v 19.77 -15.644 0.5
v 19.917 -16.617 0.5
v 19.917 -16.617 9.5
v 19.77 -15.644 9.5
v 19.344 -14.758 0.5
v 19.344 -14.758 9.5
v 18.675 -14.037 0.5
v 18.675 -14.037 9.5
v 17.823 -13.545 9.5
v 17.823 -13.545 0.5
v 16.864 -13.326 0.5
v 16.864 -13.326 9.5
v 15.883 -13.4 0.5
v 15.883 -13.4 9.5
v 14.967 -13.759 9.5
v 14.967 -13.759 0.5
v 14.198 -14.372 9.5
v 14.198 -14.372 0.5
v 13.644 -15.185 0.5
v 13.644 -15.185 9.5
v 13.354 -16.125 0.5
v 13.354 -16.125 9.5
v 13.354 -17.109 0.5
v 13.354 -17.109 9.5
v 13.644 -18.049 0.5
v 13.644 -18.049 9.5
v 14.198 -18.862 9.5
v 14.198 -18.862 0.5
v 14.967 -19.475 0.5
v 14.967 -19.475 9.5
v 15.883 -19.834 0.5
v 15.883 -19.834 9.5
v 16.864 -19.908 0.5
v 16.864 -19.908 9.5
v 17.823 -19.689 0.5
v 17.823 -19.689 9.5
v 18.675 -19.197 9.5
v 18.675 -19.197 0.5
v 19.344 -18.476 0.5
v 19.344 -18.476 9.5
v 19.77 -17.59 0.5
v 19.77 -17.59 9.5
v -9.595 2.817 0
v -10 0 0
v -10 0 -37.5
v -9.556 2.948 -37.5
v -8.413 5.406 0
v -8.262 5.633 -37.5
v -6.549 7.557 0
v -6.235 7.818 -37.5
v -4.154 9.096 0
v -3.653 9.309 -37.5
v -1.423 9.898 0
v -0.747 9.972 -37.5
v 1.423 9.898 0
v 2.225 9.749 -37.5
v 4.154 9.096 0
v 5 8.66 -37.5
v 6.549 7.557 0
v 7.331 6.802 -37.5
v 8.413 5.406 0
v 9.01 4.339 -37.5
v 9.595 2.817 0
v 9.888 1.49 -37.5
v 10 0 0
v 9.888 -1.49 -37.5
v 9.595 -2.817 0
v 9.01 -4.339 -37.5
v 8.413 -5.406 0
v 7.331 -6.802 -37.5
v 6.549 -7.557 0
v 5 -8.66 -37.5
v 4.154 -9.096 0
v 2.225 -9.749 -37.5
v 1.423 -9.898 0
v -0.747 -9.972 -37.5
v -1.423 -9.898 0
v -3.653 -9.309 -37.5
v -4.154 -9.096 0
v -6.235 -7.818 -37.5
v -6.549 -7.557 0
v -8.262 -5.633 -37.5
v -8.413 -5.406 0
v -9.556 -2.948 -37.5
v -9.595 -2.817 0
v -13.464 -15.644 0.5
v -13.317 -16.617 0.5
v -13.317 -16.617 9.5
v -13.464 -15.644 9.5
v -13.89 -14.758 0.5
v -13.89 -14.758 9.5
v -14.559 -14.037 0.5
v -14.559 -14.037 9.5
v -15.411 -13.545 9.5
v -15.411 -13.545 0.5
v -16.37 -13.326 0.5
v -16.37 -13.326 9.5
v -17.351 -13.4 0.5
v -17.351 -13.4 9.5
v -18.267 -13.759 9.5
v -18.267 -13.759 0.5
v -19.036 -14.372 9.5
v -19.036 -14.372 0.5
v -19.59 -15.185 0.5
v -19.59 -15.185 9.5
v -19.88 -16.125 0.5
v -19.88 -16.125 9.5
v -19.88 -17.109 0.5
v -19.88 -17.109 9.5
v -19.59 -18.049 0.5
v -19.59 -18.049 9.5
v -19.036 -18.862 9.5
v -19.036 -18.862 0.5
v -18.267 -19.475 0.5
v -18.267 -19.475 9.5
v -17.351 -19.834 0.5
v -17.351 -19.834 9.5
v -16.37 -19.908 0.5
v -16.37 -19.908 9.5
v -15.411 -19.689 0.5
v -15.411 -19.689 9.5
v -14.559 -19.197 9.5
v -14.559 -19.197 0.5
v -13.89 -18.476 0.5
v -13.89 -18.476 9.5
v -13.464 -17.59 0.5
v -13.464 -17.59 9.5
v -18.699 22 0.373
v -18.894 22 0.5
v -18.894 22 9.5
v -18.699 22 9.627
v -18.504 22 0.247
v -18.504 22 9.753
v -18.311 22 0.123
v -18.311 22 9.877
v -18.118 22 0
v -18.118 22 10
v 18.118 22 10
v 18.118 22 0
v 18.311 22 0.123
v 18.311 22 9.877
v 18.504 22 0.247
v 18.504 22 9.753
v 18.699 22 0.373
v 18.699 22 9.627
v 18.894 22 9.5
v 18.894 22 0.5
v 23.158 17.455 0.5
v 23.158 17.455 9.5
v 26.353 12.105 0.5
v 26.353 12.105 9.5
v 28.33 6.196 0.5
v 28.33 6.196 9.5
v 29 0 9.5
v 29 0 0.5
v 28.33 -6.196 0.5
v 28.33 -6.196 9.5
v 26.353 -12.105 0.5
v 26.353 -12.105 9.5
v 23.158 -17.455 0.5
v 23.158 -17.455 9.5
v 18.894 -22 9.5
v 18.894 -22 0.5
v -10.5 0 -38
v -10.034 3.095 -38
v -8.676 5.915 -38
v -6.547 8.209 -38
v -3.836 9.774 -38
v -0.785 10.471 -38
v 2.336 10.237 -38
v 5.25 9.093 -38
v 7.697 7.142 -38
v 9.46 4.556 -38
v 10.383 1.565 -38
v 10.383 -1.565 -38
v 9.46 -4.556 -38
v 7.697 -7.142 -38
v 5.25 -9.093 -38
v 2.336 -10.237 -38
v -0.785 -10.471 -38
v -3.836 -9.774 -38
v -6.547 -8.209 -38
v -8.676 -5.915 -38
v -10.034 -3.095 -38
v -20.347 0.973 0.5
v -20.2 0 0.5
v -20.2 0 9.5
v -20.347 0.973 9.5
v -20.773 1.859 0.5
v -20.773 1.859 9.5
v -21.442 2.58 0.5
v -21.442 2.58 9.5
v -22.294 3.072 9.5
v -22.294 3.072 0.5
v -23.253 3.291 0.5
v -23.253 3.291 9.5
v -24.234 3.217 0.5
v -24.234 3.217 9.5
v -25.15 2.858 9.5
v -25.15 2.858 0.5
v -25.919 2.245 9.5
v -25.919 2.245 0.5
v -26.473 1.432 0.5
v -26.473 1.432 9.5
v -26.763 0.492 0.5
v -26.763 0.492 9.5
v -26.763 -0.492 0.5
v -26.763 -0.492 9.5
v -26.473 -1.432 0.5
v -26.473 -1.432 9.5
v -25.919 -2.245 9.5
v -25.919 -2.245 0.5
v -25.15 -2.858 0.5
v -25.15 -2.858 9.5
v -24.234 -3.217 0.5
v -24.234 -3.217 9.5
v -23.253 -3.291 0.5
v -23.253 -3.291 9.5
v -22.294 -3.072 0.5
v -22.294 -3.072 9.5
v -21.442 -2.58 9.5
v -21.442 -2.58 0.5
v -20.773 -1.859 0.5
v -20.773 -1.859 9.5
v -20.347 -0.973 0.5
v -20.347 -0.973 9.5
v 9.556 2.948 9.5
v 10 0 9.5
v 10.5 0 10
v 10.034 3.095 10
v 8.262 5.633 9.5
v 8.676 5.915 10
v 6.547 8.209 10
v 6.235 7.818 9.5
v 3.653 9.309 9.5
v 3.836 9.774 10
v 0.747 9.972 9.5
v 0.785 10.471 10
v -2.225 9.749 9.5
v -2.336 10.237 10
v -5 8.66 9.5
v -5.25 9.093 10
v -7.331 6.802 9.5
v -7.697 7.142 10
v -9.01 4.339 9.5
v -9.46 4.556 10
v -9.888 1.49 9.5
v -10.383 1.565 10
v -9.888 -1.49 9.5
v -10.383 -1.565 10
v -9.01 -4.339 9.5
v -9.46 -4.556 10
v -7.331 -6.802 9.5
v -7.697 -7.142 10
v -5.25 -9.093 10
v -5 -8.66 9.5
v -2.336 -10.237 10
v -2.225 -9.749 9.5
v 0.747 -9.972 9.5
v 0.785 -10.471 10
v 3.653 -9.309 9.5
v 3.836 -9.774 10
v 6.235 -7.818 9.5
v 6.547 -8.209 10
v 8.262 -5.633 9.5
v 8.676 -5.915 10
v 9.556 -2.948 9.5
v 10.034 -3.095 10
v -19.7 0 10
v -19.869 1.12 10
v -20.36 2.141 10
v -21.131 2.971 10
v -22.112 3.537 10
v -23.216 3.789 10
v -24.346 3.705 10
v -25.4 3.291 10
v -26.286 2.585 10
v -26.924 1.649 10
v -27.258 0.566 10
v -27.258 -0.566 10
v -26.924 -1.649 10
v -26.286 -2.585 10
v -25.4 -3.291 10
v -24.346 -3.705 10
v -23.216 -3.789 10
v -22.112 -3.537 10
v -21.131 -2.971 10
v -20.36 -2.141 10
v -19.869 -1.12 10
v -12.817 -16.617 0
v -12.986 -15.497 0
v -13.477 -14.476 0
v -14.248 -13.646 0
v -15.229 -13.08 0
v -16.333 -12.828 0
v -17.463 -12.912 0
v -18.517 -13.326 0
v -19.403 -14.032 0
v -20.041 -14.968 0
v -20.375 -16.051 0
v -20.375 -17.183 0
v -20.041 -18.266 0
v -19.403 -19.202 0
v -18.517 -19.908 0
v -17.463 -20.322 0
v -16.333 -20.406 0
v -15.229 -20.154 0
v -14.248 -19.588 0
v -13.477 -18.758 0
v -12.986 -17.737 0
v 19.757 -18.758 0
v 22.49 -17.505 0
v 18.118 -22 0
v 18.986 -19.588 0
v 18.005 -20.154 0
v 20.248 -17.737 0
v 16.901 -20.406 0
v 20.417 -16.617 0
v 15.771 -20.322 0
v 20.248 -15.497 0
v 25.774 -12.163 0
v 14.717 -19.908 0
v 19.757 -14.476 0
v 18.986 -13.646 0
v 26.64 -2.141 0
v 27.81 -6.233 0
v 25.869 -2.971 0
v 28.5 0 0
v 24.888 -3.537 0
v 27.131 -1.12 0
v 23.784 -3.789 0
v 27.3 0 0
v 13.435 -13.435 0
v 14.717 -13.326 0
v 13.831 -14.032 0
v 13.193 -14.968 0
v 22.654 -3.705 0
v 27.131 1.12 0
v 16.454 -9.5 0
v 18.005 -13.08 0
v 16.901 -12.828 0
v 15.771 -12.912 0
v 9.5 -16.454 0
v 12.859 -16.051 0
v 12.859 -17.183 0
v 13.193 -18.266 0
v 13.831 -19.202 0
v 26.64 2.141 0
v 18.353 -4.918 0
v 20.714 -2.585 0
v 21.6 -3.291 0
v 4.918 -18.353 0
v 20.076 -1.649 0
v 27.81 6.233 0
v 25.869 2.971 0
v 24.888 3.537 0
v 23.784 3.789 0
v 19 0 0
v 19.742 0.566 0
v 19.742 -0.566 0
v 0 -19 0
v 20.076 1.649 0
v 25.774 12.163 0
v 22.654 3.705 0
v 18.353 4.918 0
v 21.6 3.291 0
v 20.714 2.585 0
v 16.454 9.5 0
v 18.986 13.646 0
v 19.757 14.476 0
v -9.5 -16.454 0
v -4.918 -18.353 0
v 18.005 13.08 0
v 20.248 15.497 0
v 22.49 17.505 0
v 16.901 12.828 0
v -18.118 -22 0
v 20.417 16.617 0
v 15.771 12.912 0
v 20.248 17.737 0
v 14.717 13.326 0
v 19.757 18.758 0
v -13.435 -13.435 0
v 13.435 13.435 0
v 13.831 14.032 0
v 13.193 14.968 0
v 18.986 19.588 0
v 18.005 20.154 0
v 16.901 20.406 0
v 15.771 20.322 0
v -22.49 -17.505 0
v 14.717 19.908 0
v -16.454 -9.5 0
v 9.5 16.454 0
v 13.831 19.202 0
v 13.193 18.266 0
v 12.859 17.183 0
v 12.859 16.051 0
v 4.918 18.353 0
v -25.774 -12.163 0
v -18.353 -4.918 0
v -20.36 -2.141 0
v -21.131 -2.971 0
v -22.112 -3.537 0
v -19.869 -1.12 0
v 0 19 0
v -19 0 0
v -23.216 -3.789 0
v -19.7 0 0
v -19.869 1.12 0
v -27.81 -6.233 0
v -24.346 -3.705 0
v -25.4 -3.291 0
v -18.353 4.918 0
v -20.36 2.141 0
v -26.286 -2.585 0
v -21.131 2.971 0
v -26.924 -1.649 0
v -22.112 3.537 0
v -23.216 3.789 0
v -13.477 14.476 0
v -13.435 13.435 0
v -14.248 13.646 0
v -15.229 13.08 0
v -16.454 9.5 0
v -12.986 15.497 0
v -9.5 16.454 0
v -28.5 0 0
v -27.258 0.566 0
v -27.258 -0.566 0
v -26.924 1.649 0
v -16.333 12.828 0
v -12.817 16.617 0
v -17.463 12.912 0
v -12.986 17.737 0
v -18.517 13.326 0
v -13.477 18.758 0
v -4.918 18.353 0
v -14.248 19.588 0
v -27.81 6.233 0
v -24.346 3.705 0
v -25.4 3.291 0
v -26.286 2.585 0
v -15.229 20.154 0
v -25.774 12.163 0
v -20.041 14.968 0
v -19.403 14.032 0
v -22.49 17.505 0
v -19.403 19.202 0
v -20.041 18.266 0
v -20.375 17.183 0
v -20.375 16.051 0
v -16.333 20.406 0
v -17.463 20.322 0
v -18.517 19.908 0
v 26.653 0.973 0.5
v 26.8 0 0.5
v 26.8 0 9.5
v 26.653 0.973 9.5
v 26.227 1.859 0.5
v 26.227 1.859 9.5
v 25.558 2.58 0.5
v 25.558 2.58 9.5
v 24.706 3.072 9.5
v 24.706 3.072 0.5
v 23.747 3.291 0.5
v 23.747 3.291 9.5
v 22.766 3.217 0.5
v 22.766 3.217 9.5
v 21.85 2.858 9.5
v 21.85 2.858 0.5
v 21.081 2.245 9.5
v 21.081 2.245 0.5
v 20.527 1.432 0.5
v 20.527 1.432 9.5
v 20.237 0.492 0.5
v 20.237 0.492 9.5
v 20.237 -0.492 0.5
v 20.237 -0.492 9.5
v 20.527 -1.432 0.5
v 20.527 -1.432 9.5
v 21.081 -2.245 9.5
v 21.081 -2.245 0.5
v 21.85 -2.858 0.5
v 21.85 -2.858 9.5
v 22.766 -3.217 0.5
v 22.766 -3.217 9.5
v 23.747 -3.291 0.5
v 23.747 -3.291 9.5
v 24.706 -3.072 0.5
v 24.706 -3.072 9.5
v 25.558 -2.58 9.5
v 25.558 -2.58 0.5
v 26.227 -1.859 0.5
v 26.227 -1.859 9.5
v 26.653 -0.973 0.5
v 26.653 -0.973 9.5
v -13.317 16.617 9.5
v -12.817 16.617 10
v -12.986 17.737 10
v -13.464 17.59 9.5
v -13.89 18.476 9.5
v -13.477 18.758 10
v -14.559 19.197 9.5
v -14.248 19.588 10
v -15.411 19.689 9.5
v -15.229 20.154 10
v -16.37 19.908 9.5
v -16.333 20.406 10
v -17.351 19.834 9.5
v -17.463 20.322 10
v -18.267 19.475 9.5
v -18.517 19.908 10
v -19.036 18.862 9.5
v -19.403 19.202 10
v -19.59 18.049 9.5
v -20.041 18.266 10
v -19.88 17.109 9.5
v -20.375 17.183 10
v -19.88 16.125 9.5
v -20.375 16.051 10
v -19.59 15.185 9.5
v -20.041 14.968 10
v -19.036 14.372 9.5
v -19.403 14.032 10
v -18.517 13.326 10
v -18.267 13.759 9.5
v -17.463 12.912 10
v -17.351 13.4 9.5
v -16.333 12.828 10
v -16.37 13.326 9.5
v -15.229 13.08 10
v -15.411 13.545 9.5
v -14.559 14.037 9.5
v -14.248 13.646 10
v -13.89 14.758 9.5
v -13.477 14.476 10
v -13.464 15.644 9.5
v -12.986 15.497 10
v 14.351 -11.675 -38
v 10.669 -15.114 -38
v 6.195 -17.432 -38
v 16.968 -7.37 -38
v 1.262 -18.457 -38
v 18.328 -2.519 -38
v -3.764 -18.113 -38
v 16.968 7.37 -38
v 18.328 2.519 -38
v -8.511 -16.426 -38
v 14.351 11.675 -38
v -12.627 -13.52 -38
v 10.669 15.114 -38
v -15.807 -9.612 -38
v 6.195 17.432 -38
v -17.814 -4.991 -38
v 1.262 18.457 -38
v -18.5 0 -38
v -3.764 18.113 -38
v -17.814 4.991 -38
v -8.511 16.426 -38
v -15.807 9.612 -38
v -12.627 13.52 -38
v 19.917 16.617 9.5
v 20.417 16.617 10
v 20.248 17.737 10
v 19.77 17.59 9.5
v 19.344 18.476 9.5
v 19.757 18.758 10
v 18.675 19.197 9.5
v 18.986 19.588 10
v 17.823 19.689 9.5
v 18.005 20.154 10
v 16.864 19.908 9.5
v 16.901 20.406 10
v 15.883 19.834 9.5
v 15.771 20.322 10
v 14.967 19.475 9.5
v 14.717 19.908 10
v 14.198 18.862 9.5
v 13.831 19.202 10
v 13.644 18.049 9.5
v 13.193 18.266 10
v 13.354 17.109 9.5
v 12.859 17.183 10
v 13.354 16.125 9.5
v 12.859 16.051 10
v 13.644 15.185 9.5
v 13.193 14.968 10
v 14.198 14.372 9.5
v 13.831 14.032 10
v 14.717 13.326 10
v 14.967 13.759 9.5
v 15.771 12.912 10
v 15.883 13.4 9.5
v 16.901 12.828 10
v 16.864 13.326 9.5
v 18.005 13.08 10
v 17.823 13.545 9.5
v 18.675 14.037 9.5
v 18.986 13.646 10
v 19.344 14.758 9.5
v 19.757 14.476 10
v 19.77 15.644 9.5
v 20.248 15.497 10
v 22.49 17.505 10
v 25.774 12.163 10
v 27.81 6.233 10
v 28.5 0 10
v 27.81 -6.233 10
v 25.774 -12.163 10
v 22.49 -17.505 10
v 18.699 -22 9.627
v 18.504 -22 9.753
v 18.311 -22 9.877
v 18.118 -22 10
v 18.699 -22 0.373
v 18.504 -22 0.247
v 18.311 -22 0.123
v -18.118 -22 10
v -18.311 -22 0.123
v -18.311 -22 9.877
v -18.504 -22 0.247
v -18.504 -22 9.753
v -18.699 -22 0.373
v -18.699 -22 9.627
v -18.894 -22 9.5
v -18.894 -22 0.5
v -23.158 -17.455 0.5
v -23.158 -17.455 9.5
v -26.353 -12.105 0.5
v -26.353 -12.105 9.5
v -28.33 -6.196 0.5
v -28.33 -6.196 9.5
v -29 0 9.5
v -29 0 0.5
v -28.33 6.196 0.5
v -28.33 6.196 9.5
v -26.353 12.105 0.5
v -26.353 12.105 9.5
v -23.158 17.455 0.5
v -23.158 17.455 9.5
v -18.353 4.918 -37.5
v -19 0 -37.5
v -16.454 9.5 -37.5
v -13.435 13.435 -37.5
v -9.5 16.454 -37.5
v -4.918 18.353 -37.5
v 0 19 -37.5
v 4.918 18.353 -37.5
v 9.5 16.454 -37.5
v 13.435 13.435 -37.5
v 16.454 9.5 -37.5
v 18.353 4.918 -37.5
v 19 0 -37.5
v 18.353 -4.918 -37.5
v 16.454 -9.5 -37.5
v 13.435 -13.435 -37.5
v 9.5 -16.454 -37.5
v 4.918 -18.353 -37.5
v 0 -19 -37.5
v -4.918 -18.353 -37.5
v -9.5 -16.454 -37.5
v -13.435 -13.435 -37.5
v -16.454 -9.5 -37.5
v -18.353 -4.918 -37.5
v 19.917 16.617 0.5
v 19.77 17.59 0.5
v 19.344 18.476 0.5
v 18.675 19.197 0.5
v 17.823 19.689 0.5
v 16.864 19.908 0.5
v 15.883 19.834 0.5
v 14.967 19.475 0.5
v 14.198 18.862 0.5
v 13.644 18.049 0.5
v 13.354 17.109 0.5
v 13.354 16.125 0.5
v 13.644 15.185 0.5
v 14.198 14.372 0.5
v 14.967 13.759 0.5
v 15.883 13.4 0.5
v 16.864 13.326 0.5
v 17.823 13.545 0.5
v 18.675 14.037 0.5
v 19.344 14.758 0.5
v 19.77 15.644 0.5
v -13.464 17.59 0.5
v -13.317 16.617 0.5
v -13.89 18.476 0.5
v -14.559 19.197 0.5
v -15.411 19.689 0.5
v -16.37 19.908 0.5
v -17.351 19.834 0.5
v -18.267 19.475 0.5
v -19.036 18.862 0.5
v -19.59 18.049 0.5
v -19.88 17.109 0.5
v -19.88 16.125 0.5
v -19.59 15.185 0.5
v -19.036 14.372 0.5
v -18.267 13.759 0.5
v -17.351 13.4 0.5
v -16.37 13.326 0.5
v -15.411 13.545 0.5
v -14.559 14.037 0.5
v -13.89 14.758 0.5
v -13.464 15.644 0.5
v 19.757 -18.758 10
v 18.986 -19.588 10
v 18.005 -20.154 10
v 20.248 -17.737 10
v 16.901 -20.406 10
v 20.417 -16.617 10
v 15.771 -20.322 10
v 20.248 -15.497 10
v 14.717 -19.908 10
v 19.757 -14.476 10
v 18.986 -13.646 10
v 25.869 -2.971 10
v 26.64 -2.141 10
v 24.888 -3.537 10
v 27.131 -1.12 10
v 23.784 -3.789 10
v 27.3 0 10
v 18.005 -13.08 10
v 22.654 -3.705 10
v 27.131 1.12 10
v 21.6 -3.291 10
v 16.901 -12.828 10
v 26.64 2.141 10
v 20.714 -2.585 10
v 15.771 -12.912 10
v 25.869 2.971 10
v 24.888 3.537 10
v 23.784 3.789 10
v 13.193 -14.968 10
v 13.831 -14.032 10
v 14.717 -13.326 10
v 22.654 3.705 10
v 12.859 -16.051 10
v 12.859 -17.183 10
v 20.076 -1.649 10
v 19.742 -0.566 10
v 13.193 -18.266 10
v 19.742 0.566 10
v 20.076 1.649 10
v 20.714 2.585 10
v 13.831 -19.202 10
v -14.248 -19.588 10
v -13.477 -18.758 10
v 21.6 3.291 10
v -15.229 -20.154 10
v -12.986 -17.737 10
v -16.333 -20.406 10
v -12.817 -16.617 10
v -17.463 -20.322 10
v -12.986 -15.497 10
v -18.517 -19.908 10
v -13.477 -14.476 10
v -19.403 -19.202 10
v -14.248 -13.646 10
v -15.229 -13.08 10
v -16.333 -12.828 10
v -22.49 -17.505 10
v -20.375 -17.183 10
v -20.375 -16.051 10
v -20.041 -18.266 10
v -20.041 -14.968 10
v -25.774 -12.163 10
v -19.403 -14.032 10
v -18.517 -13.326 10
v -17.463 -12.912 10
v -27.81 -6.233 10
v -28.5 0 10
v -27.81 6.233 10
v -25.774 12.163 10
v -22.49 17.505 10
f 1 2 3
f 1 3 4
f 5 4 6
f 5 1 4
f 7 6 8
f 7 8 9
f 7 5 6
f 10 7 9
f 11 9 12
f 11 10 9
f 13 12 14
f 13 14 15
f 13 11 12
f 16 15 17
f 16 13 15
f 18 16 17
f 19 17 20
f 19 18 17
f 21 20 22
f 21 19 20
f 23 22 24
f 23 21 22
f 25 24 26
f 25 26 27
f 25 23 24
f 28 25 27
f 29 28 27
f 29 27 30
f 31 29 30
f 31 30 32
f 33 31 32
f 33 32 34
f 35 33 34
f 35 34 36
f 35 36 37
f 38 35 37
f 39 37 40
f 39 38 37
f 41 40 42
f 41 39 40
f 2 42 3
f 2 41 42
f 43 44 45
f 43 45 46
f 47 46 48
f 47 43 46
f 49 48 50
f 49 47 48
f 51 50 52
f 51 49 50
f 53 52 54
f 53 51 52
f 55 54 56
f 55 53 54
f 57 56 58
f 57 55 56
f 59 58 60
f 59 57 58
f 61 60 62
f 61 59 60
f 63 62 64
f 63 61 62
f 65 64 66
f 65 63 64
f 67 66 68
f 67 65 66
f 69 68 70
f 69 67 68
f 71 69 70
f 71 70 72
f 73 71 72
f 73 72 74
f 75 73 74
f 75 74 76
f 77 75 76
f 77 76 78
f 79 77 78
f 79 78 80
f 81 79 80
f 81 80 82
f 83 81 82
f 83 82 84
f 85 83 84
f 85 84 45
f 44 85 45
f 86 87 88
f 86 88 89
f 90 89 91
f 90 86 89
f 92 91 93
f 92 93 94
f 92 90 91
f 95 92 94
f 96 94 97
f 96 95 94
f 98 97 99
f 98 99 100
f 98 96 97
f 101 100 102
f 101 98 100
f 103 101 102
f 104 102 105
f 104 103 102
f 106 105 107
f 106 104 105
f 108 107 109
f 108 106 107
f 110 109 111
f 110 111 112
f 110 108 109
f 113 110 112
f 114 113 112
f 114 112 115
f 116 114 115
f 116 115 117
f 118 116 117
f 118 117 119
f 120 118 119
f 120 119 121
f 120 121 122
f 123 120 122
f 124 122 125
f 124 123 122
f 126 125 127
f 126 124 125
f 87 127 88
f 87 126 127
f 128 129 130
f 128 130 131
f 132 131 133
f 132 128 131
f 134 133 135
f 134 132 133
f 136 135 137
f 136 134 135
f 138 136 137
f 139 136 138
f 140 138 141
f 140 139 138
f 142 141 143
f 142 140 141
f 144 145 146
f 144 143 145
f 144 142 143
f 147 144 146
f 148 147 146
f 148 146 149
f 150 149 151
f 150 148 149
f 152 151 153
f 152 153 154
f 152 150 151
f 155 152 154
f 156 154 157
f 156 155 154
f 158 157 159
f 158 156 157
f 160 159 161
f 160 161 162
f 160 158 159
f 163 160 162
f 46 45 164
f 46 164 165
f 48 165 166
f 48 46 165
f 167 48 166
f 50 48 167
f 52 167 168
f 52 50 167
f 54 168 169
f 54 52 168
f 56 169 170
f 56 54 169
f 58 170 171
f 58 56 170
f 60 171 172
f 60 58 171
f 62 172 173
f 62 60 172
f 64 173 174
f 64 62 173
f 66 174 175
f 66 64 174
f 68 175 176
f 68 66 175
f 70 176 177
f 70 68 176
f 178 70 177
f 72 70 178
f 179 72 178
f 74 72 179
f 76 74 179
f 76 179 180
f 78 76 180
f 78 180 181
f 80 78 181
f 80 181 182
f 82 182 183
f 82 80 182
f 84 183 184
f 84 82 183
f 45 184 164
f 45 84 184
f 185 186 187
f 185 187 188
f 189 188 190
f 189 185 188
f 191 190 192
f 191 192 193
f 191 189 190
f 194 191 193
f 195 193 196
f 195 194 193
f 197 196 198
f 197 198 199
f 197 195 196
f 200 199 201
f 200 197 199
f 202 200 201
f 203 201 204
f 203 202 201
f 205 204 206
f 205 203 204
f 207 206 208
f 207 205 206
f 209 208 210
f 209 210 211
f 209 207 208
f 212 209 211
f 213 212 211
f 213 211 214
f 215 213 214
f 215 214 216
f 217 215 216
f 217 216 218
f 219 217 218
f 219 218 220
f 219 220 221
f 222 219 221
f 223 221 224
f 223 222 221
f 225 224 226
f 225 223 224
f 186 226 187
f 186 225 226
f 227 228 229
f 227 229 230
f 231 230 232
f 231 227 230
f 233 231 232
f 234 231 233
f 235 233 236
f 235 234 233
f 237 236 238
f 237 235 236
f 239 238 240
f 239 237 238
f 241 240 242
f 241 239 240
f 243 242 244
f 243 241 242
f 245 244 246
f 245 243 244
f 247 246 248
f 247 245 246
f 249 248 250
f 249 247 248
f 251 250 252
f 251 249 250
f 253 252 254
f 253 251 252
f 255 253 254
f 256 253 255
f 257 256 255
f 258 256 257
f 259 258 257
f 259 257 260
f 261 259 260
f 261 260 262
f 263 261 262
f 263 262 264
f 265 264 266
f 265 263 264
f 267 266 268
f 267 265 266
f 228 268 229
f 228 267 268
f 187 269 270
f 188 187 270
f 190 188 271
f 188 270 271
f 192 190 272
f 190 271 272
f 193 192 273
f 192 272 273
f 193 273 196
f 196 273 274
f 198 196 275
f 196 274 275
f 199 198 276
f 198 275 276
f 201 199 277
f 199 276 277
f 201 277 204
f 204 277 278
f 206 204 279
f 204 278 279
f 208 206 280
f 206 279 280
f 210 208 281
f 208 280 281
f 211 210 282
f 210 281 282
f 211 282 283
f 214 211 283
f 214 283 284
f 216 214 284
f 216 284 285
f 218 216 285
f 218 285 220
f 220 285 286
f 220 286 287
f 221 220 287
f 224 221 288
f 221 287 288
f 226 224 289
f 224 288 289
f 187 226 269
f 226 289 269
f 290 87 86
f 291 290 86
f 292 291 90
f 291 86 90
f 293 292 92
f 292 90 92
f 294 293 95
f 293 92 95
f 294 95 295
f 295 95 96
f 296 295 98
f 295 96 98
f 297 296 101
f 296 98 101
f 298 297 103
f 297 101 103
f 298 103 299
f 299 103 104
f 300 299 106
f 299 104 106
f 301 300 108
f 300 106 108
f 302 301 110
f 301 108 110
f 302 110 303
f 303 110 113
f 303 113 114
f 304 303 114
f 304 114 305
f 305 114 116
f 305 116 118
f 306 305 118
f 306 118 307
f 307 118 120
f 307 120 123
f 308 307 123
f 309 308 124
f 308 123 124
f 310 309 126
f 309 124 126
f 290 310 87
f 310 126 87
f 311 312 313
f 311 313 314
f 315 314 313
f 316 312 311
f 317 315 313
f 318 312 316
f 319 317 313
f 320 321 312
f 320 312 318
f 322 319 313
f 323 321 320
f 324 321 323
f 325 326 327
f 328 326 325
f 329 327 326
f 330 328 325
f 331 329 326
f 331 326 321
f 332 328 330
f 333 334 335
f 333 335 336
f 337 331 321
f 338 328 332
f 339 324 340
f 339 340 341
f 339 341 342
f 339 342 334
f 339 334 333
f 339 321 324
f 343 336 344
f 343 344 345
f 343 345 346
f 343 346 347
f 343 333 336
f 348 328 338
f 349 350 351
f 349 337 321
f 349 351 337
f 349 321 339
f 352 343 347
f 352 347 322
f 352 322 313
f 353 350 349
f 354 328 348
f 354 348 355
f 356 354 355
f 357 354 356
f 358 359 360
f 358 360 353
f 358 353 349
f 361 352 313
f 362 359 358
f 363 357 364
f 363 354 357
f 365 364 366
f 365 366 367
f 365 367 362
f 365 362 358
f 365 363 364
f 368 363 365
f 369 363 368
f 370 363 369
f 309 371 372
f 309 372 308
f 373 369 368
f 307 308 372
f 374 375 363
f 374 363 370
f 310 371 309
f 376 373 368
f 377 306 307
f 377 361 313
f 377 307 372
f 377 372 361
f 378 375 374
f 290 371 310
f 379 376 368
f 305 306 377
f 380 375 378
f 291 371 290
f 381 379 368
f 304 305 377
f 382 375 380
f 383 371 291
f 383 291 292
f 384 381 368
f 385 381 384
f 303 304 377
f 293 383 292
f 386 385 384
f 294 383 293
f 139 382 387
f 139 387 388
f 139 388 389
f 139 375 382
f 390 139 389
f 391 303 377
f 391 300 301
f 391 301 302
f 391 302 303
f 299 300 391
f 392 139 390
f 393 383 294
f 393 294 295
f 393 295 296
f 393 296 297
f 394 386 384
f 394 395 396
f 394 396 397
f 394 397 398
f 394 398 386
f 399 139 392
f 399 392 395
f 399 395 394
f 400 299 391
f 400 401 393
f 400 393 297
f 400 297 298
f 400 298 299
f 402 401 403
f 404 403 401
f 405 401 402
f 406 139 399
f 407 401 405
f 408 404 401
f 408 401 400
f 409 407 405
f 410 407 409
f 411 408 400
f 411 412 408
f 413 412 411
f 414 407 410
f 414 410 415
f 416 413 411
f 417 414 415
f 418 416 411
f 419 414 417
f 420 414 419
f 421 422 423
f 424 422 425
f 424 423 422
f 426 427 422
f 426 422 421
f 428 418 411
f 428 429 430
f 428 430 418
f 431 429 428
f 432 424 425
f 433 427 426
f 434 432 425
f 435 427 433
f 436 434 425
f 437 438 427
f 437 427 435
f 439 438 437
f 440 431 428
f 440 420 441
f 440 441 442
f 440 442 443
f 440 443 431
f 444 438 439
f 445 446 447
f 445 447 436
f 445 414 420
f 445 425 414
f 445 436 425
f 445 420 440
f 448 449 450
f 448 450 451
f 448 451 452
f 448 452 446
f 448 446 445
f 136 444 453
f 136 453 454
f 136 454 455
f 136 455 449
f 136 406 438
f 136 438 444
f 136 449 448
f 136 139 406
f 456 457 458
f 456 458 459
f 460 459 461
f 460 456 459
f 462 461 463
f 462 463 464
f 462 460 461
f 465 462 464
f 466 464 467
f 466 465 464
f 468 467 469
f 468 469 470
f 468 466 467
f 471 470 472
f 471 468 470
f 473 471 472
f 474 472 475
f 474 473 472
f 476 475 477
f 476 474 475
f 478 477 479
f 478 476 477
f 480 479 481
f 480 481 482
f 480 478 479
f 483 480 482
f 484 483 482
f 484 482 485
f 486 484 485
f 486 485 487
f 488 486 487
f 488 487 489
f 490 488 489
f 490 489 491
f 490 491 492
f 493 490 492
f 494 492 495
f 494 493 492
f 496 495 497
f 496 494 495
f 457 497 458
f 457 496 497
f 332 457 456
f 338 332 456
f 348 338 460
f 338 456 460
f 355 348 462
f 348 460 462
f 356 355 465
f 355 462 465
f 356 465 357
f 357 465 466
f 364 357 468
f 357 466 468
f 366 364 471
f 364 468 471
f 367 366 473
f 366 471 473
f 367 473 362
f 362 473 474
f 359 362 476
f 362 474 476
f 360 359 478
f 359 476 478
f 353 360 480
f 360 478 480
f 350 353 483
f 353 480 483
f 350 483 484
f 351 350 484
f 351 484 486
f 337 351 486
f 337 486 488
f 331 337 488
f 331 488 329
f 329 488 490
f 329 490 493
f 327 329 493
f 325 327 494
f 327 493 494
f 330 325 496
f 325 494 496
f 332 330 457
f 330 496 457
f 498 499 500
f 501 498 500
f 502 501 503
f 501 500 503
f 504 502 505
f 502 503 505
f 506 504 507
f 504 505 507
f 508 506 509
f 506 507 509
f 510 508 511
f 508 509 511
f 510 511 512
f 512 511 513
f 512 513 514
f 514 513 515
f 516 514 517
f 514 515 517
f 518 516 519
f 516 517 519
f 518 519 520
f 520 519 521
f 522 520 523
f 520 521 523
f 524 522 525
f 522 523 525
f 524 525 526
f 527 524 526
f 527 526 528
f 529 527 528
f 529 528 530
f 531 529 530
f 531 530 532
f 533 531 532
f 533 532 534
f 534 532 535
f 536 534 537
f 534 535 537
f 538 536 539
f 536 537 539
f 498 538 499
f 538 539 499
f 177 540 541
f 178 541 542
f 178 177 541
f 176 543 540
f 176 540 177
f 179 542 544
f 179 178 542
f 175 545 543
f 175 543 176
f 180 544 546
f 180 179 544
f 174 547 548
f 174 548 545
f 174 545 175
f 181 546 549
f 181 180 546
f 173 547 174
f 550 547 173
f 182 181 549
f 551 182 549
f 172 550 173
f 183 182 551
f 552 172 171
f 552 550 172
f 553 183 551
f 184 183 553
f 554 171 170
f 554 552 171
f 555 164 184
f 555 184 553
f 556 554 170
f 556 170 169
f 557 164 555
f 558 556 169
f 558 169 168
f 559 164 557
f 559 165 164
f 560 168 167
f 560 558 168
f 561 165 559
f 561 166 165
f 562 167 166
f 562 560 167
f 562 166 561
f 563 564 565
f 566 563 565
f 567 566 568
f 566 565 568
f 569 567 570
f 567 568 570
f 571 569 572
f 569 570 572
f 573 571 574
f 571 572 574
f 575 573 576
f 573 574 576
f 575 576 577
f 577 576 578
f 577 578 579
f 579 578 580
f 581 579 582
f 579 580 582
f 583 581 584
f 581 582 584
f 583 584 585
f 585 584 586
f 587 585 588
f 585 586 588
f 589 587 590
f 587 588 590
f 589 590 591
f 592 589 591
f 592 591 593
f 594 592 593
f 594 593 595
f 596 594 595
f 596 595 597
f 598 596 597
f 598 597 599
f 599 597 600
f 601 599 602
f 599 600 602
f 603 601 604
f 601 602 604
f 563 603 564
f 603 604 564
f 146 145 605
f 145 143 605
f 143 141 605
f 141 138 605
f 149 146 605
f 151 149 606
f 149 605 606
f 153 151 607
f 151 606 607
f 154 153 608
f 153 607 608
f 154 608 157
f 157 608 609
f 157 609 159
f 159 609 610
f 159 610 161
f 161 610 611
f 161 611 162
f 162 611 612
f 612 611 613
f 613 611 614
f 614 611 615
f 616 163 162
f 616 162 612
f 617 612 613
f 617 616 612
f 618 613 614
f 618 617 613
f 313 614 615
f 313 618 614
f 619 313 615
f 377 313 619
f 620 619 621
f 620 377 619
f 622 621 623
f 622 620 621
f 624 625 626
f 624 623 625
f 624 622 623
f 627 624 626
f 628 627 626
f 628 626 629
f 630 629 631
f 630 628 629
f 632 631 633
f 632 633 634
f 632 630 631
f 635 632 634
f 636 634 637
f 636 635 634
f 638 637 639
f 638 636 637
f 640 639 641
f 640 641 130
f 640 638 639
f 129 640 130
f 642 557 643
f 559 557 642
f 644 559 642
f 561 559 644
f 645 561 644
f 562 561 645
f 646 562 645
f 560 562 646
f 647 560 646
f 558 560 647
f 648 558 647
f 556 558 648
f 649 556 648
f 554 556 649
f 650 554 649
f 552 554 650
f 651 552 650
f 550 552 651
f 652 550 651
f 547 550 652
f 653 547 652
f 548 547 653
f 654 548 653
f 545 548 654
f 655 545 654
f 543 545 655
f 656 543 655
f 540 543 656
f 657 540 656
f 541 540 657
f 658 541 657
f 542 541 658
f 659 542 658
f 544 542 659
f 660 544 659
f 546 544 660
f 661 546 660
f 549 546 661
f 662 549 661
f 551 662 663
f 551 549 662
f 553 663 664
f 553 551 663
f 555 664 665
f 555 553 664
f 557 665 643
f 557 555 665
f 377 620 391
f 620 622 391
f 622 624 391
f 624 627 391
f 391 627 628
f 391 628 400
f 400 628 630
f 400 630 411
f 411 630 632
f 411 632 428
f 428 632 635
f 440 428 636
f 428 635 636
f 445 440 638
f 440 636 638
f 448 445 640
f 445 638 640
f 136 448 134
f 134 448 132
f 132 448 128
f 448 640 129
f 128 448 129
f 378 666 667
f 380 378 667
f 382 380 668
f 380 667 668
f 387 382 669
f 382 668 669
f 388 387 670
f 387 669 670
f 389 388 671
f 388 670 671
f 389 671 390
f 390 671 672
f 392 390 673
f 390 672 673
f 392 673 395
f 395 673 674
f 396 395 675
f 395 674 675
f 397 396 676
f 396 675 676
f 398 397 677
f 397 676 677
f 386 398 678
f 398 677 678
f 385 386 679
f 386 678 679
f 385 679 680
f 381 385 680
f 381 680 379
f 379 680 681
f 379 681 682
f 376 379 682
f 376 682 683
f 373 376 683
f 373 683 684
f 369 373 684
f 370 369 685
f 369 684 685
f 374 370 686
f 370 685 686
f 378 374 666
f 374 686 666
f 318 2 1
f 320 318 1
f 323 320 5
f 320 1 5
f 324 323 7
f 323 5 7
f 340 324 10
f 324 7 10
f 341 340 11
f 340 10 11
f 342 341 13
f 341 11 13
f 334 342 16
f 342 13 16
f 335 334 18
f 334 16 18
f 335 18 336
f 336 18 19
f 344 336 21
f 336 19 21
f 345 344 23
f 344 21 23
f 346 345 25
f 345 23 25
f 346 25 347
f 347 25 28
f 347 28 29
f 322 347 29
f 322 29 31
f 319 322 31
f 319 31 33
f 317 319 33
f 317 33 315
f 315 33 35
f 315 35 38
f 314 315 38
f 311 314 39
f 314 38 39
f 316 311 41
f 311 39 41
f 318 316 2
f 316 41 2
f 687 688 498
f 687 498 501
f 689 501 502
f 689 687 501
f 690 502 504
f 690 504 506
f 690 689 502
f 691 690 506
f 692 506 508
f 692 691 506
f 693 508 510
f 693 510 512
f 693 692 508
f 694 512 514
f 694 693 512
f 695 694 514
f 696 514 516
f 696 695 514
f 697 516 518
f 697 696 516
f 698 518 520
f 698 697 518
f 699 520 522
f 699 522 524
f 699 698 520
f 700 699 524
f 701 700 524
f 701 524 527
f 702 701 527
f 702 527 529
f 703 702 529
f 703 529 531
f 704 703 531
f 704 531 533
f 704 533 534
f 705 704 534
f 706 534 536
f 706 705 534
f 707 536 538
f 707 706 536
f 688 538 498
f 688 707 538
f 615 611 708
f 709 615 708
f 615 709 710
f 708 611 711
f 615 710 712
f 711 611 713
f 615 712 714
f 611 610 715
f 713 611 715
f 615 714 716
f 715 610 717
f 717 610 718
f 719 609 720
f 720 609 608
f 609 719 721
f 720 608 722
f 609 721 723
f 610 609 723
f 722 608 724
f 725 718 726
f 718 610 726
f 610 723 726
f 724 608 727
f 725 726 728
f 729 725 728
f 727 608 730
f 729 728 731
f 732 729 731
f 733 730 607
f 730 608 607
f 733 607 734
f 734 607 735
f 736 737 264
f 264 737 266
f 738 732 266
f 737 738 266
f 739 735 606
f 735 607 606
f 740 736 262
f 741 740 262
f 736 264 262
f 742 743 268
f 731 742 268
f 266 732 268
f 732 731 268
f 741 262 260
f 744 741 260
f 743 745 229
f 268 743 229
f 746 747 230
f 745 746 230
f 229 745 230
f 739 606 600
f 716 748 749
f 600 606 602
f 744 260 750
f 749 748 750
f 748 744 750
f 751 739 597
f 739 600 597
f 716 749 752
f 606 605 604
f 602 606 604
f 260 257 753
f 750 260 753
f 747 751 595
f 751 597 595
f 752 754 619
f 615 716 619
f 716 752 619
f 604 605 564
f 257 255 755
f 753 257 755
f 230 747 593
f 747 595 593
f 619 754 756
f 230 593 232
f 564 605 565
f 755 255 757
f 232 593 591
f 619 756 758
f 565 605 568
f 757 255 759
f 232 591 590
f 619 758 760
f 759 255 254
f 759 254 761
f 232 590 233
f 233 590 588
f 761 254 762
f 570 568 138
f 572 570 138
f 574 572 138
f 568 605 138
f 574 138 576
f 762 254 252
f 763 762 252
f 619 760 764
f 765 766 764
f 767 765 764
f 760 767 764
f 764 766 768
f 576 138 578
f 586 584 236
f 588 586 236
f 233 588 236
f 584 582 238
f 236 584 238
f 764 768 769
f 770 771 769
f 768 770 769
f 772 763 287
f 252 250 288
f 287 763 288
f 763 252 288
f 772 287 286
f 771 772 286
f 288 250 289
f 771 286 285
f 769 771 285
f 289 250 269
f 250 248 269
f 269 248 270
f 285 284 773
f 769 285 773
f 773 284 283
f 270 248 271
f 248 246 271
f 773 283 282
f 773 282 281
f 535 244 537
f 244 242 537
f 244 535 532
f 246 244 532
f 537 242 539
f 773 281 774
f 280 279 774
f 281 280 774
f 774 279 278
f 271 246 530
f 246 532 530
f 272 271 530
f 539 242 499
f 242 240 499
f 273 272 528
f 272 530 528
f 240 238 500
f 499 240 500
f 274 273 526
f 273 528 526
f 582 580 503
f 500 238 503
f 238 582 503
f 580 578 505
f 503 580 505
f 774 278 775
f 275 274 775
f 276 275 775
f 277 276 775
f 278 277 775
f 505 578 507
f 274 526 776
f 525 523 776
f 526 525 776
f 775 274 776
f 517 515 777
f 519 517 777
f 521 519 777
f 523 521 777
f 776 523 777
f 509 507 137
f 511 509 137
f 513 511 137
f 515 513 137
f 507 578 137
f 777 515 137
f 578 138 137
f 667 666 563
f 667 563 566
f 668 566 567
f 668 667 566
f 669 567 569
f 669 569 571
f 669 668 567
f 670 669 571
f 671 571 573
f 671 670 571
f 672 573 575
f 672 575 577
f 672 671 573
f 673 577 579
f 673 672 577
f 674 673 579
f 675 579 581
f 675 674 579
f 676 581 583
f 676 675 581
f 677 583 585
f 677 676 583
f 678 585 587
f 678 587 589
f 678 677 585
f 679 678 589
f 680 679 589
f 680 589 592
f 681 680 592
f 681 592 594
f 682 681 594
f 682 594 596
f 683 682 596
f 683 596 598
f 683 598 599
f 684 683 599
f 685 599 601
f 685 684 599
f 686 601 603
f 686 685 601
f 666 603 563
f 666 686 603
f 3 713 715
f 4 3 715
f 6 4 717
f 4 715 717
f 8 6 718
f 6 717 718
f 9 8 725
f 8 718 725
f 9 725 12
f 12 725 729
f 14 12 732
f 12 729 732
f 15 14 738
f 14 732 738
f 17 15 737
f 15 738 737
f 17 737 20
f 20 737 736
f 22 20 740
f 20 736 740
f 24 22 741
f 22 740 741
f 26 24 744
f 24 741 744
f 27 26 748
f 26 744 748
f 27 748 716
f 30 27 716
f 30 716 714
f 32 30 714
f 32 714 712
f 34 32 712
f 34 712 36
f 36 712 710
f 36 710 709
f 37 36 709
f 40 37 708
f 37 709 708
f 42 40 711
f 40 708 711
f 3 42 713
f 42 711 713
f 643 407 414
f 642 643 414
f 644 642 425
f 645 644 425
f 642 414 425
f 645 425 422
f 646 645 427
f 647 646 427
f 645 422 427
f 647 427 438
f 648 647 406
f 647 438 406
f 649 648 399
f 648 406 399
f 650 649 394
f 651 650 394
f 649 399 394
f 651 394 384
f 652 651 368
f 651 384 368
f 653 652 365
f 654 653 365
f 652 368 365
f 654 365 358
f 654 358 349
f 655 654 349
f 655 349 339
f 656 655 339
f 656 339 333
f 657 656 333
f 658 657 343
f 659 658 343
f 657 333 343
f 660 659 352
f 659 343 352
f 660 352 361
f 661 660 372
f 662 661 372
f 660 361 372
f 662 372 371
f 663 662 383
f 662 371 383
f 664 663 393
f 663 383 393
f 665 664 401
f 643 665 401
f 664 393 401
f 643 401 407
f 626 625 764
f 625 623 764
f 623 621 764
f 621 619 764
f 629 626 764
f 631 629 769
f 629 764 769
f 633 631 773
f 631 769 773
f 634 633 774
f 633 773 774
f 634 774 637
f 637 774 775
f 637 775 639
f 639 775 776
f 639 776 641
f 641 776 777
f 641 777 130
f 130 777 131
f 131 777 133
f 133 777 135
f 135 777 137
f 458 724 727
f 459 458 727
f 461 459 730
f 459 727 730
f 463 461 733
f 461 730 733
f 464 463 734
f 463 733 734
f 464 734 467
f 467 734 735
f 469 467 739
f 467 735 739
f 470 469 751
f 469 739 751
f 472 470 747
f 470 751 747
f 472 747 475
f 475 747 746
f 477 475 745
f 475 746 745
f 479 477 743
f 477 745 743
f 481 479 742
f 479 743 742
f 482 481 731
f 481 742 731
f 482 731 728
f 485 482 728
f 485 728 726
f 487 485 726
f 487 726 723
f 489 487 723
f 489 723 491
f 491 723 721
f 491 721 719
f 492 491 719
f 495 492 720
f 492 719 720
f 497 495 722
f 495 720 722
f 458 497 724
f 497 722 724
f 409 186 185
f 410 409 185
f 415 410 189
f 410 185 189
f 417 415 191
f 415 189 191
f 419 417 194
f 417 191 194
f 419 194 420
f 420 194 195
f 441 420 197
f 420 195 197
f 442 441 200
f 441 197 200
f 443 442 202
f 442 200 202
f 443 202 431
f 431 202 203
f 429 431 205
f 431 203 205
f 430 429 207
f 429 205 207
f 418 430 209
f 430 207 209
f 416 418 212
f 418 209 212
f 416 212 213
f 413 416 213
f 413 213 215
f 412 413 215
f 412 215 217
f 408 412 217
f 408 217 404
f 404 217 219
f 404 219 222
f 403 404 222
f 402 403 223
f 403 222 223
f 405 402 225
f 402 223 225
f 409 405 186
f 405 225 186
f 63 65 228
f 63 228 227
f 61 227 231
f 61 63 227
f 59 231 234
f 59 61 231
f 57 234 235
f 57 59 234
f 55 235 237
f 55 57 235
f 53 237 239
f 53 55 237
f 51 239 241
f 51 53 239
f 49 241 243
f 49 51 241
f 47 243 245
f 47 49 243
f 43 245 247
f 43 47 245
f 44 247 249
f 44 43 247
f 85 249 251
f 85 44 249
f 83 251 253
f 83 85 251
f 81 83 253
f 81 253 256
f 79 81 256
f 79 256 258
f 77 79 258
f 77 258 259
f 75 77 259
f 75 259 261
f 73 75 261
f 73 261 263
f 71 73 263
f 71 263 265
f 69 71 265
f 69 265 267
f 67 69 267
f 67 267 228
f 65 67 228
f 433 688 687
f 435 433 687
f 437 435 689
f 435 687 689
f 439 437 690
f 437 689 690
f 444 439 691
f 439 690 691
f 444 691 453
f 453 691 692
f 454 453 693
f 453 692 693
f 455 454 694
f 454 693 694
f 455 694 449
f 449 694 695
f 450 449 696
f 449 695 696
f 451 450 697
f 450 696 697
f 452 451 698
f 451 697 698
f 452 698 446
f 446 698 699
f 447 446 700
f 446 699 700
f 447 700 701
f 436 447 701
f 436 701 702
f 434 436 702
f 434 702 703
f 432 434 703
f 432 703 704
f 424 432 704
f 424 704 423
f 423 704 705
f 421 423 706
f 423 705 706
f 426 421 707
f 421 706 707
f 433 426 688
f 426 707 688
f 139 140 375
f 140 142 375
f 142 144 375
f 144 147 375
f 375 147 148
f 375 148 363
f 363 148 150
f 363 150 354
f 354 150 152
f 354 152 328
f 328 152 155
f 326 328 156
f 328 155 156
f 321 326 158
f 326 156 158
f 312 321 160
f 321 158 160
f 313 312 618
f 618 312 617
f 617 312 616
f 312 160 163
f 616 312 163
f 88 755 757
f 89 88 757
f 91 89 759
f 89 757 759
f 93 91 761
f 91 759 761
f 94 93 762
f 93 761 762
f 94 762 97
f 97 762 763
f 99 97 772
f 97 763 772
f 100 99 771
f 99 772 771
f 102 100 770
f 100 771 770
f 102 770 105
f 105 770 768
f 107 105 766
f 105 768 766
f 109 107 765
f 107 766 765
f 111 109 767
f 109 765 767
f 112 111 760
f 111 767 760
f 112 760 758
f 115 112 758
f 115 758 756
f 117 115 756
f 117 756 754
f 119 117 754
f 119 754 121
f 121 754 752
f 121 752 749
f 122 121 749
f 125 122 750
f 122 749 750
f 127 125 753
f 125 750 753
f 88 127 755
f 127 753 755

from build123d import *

# Parameters (mm, degrees)
SZKIC1_R                    = 10
SZKIC1_R_2                  = 3.3
DODANIE_WYCI_GNI_CIE1_DEPTH = 10
SZKIC2_R                    = 19
SZKIC2_R_2                  = 10
DODANIE_WYCI_GNI_CIE2_DEPTH = 38
SFAZOWANIE1_SIZE            = 0.5
SFAZOWANIE2_SIZE            = 0.5


with BuildPart() as part:
    # Szkic1 → Dodanie-wyciągnięcie1 (new body)
    with BuildSketch(Plane.XY):
        with BuildLine():
            Line((0, -22), (-18.894443628, -22))
            ThreePointArc((-18.894443628, -22), (-29, 0), (-18.894443628, 22))
            Line((-18.894443628, 22), (0, 22))
            Line((0, 22), (18.894443628, 22))
            ThreePointArc((18.894443628, 22), (29, 0), (18.894443628, -22))
            Line((18.894443628, -22), (0, -22))
        make_face()
        Circle(SZKIC1_R, mode=Mode.SUBTRACT)
        with Locations((-16.617009358, 16.617009358)):
            Circle(SZKIC1_R_2, mode=Mode.SUBTRACT)
        with Locations((-23.5, 0)):
            Circle(SZKIC1_R_2, mode=Mode.SUBTRACT)
        with Locations((-16.617009358, -16.617009358)):
            Circle(SZKIC1_R_2, mode=Mode.SUBTRACT)
        with Locations((16.617009358, -16.617009358)):
            Circle(SZKIC1_R_2, mode=Mode.SUBTRACT)
        with Locations((23.5, 0)):
            Circle(SZKIC1_R_2, mode=Mode.SUBTRACT)
        with Locations((16.617009358, 16.617009358)):
            Circle(SZKIC1_R_2, mode=Mode.SUBTRACT)
    extrude(amount=DODANIE_WYCI_GNI_CIE1_DEPTH)

    # Szkic2 → Dodanie-wyciągnięcie2 (add)
    with BuildSketch(Plane(origin=(0, 0, 0), x_dir=(-1, 0, 0), z_dir=(0, 0, -1))):
        Circle(SZKIC2_R)
        Circle(SZKIC2_R_2, mode=Mode.SUBTRACT)
    extrude(amount=DODANIE_WYCI_GNI_CIE2_DEPTH)

    # Sfazowanie1
    sfazowanie1_edges = [part.edges().sort_by_distance(p)[0] for p in [
        (-19.917009358, 16.617009358, 0),
        (-19.917009358, 16.617009358, 10),
        (-26.8, 0, 0),
        (-26.8, 0, 10),
        (-19.917009358, -16.617009358, 0),
        (-19.917009358, -16.617009358, 10),
        (13.317009358, -16.617009358, 0),
        (13.317009358, -16.617009358, 10),
        (20.2, 0, 0),
        (20.2, 0, 10),
        (13.317009358, 16.617009358, 0),
        (13.317009358, 16.617009358, 10),
    ]]
    chamfer(sfazowanie1_edges, length=SFAZOWANIE1_SIZE)

    # Sfazowanie2
    sfazowanie2_edges = [part.edges().sort_by_distance(p)[0] for p in [
        (29, 0, 10),
        (-10, 0, 10),
        (-29, 0, 10),
        (19, 0, -38),
        (10, 0, -38),
        (29, 0, 0),
        (-29, 0, 0),
    ]]
    chamfer(sfazowanie2_edges, length=SFAZOWANIE2_SIZE)


solid = part.part
